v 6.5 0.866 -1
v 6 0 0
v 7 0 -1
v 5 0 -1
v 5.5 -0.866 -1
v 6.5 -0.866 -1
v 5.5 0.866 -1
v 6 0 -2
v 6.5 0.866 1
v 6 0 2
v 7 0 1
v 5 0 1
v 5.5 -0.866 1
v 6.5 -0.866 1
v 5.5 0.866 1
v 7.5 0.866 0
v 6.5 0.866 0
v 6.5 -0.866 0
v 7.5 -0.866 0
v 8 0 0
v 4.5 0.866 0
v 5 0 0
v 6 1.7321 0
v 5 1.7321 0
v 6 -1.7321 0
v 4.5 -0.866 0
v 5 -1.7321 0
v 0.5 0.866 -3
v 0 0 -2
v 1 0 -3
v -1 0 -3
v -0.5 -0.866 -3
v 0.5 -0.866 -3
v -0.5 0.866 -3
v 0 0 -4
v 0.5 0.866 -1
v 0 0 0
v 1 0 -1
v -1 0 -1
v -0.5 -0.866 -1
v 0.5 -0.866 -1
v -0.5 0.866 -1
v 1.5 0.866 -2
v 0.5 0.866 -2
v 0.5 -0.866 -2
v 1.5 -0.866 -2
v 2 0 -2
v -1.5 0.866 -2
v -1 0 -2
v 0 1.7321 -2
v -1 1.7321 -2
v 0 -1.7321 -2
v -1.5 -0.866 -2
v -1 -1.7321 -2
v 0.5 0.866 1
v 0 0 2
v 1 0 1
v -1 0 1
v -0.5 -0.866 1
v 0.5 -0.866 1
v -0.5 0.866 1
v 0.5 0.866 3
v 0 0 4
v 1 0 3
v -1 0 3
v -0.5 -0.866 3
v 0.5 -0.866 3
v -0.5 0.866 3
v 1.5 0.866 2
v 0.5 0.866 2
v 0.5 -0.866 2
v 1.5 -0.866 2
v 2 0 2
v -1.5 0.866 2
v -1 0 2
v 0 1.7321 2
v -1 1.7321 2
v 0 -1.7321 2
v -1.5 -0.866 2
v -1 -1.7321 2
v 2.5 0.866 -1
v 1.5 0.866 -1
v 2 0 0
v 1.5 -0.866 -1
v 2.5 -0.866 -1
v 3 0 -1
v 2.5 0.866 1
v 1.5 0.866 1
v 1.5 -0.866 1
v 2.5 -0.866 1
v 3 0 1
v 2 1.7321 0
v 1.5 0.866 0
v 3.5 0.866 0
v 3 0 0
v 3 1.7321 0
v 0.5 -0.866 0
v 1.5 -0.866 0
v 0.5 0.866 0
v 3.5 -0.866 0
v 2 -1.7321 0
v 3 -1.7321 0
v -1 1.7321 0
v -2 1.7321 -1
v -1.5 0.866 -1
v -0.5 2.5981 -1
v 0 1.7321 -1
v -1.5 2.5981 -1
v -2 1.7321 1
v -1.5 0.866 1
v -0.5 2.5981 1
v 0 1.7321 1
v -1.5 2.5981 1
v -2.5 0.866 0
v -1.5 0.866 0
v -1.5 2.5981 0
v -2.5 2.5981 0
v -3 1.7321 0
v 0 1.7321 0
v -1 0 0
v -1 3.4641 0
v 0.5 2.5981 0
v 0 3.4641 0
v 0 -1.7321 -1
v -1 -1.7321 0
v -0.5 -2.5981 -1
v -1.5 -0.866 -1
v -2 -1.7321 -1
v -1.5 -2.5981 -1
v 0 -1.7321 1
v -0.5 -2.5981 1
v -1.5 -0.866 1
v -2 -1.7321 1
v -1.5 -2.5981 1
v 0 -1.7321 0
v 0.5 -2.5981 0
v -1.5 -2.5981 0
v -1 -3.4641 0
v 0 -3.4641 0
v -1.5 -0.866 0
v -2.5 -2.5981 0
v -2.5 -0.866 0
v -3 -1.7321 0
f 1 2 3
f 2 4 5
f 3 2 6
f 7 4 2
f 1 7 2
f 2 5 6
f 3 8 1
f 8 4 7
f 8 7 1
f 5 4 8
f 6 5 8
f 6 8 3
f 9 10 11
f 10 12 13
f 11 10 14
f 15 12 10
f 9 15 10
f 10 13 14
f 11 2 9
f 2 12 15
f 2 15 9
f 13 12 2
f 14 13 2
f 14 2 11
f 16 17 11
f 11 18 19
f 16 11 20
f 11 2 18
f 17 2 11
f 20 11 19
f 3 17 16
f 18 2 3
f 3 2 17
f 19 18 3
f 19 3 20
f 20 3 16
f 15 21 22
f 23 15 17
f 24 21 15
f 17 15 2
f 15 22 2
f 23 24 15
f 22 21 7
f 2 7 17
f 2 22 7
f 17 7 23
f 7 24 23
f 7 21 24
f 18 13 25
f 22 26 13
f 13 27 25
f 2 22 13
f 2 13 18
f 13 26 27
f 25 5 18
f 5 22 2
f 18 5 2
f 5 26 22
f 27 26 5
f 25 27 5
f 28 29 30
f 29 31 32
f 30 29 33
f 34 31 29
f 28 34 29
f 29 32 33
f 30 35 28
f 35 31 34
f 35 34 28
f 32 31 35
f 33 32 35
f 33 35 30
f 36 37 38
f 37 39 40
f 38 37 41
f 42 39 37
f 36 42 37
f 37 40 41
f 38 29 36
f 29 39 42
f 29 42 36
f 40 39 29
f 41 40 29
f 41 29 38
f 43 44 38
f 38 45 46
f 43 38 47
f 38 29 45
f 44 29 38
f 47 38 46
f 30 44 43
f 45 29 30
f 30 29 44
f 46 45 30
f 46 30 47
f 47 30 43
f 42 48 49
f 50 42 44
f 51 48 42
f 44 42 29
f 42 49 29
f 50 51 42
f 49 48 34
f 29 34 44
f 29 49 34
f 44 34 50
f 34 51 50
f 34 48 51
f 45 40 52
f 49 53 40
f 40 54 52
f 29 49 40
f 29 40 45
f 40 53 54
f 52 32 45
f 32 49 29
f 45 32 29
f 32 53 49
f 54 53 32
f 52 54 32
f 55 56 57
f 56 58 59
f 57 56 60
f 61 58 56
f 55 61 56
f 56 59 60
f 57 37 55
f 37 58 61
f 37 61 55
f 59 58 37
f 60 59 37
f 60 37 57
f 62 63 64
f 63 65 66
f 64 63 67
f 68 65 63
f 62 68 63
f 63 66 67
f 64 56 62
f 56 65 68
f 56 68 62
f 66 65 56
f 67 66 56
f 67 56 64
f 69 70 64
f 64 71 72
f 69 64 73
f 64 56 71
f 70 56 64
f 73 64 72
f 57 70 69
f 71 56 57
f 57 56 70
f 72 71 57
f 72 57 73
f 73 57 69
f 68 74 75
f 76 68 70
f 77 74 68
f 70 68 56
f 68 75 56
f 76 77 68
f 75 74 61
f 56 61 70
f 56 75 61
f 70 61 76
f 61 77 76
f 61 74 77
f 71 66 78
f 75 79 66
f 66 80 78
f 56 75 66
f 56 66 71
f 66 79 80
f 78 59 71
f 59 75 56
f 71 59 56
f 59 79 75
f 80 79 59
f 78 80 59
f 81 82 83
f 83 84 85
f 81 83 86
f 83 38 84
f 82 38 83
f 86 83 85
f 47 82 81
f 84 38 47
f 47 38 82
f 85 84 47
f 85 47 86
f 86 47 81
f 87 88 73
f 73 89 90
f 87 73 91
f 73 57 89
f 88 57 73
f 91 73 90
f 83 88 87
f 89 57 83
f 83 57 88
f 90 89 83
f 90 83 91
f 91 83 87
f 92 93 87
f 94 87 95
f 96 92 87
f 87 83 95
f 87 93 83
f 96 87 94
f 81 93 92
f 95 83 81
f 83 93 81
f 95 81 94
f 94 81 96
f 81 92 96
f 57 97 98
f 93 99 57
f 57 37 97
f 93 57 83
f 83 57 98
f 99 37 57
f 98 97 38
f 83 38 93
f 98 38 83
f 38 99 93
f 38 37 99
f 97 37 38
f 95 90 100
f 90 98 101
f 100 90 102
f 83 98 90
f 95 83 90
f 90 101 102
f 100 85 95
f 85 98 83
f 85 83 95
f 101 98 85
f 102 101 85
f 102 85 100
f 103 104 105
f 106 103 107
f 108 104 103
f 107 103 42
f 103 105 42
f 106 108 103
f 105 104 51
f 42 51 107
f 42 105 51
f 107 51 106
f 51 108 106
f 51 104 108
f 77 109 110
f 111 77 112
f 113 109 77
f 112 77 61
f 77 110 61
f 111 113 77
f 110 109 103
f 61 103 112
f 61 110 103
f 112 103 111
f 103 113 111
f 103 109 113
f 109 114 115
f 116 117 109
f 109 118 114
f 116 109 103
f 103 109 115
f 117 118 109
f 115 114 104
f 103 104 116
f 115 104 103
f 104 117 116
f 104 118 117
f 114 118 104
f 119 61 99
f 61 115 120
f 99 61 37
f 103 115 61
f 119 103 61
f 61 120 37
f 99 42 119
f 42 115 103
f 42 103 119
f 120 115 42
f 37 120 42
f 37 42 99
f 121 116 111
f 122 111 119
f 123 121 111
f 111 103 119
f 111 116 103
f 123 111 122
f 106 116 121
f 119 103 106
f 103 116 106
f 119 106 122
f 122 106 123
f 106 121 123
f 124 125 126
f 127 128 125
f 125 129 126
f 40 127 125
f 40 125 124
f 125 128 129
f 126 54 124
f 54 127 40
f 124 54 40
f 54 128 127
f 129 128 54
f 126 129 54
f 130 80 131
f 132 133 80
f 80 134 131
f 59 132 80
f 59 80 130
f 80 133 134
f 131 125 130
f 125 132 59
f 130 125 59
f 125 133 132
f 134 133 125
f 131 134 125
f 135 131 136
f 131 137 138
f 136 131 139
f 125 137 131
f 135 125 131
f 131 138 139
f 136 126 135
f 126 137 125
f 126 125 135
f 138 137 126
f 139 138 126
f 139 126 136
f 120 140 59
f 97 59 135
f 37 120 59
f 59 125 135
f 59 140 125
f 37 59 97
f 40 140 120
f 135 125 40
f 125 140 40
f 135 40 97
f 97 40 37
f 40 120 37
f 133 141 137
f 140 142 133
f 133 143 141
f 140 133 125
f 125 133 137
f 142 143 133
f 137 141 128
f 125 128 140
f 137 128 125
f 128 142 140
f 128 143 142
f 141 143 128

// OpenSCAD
module octahedron() {
    
     octo_points = [
        [0, -1, 0], // belt
        [ 1, 0, 0], 
        [ 0,  1, 0], 
        [-1,  0, 0], 
        [0, 0, 1], // top
        [0, 0, -1], // bottom
    ];

    octo_faces = [
        [0, 1, 4], // top pyramid
        [1, 2, 4],
        [2, 3, 4],
        [3, 0, 4],
        [1, 0, 5], // bottom pyramid
        [2, 1, 5],
        [3, 2, 5],
        [0, 3, 5],
    ];

    polyhedron(
        points = octo_points,
        faces = octo_faces
    );
}



module octoflake(i, size, center){
    
    if (i == 0){
        translate(center) scale(size) octahedron();
    } else {
        octoflake(i-1, size/2, center + 1/2 * size * [0, -1, 0]);
        octoflake(i-1, size/2, center + 1/2 * size * [1, 0, 0]);
        octoflake(i-1, size/2, center + 1/2 * size * [0, 1, 0]);
        octoflake(i-1, size/2, center + 1/2 * size * [-1, 0, 0]);
        octoflake(i-1, size/2, center + 1/2 * size * [0, 0, 1]);
        octoflake(i-1, size/2, center + 1/2 * size * [0, 0, -1]);
    }
    
    
}


//h = sqrt(2);
//h = sqrt(3)/2;
h = 1;
r = 1;


module hexBP(f = 6, h = 1, e = 1){
                      cylinder(h, r1=r, r2=0, $fn=f);
    mirror([0, 0, 1]) cylinder(h, r1=r, r2=0, $fn=f);   
}

//module tri(h = 1, e = 1){
//    
//                      cylinder(h, r1=sqrt(3)/2, r2=0, $fn=6);
//    mirror([0, 0, 1]) cylinder(h, r1=sqrt(3)/2, r2=0, $fn=6);  
//    
//}



//octoflake(2, 1, [0,0,0]);

module hex2(){
//    scale(   [2/sqrt(3), 2/sqrt(3), 1])
    rotate([0, 0, 0])
    union(){
    translate([0,0,-h]) hexBP(6);//cylinder(1, r1=1, r2=0, $fn=6);
    translate([0,0, h]) hexBP(6);

    rotate([0, 0, 000]) translate([1,0,0]) rotate([0, 0, 60]) hexBP(3);
    rotate([0, 0, 120]) translate([1,0,0]) rotate([0, 0, 60]) hexBP(3);
    rotate([0, 0, 240]) translate([1,0,0]) rotate([0, 0, 60]) hexBP(3);
    
    rotate([0, 0, 060]) translate([1,0,0])rotate([0, 0, 60]) hexBP(3);
    rotate([0, 0, 180]) translate([1,0,0])rotate([0, 0, 60]) hexBP(3);
    rotate([0, 0, 300]) translate([1,0,0])rotate([0, 0, 60]) hexBP(3);  
    }  
    
}

module tri2(){
    translate([0,0,-h]) hexBP(6);//cylinder(1, r1=1, r2=0, $fn=6);
    translate([0,0, h]) hexBP(6);

    rotate([0, 0, 000]) translate([1,0,0]) rotate([0, 0, 60]) hexBP(6);
    rotate([0, 0, 120]) translate([1,0,0]) rotate([0, 0, 60]) hexBP(6);
    rotate([0, 0, 240]) translate([1,0,0]) rotate([0, 0, 60]) hexBP(6);
    
//    rotate([0, 0, 060]) translate([1,0,0])rotate([0, 0, 60]) hexBP(3);
//    rotate([0, 0, 180]) translate([1,0,0])rotate([0, 0, 60]) hexBP(3);
//    rotate([0, 0, 300]) translate([1,0,0])rotate([0, 0, 60]) hexBP(3);    
    
}

//tri2();
translate([6, 0, 0]) tri2();


//translate([0,0,-2 * h]) hex2();
//translate([0,0, 2 * h]) hex2();
//
//rotate([0, 0,   0]) translate([2,0,0]) rotate([0, 0, 0]) hex2();
//rotate([0, 0, 120]) translate([2,0,0]) rotate([0, 0, 0])hex2();
//rotate([0, 0, 240]) translate([2,0,0]) rotate([0, 0, 0])hex2();

//rotate([0, 0, 30]) translate([sqrt(3),0,0]) rotate([0, 0, 30]) hex2();
//rotate([0, 0, 30 + 120]) translate([sqrt(3),0,0]) rotate([0, 0, 30]) hex2();
//rotate([0, 0, 30 + 240]) translate([sqrt(3),0,0]) rotate([0, 0, 30]) hex2();
//rotate([0, 0, 180]) translate([2,0,0]) hex2();
//rotate([0, 0, 300]) translate([2,0,0]) hex2(); 

module hex3(){
    rotate([0, 0, 00]) translate([0,0,-2 * h]) tri2();
    rotate([0, 0, 00]) translate([0,0, 2 * h]) tri2();
    //
    //rotate([0, 0,   0]) translate([2,0,0]) rotate([0, 0, 0]) hex2();
    //rotate([0, 0, 120]) translate([2,0,0]) rotate([0, 0, 0])hex2();
    //rotate([0, 0, 240]) translate([2,0,0]) rotate([0, 0, 0])hex2();

    rotate([0, 0, 0]) translate([2,0,0]) rotate([0, 0, 60]) tri2();
    rotate([0, 0, 0 + 120]) translate([2,0,0]) rotate([0, 0, 60]) tri2();
    rotate([0, 0, 0 + 240]) translate([2,0,0]) rotate([0, 0, 60]) tri2();
    //rotate([0, 0, 180]) translate([2,0,0]) hex2();
    //rotate([0, 0, 300]) translate([2,0,0]) hex2(); 
        
}

hex3();


//translate([0,0,-3* h]) hex3();
//translate([0,0, 3 * h]) hex3();
//rotate([0, 0, 0]) translate([3,0,0]) rotate([0, 0, 0]) hex3();
//rotate([0, 0, 0 + 120]) translate([3,0,0]) rotate([0, 0, 0]) hex3();
//rotate([0, 0, 0 + 240]) translate([3,0,0]) rotate([0, 0, 0]) hex3();
